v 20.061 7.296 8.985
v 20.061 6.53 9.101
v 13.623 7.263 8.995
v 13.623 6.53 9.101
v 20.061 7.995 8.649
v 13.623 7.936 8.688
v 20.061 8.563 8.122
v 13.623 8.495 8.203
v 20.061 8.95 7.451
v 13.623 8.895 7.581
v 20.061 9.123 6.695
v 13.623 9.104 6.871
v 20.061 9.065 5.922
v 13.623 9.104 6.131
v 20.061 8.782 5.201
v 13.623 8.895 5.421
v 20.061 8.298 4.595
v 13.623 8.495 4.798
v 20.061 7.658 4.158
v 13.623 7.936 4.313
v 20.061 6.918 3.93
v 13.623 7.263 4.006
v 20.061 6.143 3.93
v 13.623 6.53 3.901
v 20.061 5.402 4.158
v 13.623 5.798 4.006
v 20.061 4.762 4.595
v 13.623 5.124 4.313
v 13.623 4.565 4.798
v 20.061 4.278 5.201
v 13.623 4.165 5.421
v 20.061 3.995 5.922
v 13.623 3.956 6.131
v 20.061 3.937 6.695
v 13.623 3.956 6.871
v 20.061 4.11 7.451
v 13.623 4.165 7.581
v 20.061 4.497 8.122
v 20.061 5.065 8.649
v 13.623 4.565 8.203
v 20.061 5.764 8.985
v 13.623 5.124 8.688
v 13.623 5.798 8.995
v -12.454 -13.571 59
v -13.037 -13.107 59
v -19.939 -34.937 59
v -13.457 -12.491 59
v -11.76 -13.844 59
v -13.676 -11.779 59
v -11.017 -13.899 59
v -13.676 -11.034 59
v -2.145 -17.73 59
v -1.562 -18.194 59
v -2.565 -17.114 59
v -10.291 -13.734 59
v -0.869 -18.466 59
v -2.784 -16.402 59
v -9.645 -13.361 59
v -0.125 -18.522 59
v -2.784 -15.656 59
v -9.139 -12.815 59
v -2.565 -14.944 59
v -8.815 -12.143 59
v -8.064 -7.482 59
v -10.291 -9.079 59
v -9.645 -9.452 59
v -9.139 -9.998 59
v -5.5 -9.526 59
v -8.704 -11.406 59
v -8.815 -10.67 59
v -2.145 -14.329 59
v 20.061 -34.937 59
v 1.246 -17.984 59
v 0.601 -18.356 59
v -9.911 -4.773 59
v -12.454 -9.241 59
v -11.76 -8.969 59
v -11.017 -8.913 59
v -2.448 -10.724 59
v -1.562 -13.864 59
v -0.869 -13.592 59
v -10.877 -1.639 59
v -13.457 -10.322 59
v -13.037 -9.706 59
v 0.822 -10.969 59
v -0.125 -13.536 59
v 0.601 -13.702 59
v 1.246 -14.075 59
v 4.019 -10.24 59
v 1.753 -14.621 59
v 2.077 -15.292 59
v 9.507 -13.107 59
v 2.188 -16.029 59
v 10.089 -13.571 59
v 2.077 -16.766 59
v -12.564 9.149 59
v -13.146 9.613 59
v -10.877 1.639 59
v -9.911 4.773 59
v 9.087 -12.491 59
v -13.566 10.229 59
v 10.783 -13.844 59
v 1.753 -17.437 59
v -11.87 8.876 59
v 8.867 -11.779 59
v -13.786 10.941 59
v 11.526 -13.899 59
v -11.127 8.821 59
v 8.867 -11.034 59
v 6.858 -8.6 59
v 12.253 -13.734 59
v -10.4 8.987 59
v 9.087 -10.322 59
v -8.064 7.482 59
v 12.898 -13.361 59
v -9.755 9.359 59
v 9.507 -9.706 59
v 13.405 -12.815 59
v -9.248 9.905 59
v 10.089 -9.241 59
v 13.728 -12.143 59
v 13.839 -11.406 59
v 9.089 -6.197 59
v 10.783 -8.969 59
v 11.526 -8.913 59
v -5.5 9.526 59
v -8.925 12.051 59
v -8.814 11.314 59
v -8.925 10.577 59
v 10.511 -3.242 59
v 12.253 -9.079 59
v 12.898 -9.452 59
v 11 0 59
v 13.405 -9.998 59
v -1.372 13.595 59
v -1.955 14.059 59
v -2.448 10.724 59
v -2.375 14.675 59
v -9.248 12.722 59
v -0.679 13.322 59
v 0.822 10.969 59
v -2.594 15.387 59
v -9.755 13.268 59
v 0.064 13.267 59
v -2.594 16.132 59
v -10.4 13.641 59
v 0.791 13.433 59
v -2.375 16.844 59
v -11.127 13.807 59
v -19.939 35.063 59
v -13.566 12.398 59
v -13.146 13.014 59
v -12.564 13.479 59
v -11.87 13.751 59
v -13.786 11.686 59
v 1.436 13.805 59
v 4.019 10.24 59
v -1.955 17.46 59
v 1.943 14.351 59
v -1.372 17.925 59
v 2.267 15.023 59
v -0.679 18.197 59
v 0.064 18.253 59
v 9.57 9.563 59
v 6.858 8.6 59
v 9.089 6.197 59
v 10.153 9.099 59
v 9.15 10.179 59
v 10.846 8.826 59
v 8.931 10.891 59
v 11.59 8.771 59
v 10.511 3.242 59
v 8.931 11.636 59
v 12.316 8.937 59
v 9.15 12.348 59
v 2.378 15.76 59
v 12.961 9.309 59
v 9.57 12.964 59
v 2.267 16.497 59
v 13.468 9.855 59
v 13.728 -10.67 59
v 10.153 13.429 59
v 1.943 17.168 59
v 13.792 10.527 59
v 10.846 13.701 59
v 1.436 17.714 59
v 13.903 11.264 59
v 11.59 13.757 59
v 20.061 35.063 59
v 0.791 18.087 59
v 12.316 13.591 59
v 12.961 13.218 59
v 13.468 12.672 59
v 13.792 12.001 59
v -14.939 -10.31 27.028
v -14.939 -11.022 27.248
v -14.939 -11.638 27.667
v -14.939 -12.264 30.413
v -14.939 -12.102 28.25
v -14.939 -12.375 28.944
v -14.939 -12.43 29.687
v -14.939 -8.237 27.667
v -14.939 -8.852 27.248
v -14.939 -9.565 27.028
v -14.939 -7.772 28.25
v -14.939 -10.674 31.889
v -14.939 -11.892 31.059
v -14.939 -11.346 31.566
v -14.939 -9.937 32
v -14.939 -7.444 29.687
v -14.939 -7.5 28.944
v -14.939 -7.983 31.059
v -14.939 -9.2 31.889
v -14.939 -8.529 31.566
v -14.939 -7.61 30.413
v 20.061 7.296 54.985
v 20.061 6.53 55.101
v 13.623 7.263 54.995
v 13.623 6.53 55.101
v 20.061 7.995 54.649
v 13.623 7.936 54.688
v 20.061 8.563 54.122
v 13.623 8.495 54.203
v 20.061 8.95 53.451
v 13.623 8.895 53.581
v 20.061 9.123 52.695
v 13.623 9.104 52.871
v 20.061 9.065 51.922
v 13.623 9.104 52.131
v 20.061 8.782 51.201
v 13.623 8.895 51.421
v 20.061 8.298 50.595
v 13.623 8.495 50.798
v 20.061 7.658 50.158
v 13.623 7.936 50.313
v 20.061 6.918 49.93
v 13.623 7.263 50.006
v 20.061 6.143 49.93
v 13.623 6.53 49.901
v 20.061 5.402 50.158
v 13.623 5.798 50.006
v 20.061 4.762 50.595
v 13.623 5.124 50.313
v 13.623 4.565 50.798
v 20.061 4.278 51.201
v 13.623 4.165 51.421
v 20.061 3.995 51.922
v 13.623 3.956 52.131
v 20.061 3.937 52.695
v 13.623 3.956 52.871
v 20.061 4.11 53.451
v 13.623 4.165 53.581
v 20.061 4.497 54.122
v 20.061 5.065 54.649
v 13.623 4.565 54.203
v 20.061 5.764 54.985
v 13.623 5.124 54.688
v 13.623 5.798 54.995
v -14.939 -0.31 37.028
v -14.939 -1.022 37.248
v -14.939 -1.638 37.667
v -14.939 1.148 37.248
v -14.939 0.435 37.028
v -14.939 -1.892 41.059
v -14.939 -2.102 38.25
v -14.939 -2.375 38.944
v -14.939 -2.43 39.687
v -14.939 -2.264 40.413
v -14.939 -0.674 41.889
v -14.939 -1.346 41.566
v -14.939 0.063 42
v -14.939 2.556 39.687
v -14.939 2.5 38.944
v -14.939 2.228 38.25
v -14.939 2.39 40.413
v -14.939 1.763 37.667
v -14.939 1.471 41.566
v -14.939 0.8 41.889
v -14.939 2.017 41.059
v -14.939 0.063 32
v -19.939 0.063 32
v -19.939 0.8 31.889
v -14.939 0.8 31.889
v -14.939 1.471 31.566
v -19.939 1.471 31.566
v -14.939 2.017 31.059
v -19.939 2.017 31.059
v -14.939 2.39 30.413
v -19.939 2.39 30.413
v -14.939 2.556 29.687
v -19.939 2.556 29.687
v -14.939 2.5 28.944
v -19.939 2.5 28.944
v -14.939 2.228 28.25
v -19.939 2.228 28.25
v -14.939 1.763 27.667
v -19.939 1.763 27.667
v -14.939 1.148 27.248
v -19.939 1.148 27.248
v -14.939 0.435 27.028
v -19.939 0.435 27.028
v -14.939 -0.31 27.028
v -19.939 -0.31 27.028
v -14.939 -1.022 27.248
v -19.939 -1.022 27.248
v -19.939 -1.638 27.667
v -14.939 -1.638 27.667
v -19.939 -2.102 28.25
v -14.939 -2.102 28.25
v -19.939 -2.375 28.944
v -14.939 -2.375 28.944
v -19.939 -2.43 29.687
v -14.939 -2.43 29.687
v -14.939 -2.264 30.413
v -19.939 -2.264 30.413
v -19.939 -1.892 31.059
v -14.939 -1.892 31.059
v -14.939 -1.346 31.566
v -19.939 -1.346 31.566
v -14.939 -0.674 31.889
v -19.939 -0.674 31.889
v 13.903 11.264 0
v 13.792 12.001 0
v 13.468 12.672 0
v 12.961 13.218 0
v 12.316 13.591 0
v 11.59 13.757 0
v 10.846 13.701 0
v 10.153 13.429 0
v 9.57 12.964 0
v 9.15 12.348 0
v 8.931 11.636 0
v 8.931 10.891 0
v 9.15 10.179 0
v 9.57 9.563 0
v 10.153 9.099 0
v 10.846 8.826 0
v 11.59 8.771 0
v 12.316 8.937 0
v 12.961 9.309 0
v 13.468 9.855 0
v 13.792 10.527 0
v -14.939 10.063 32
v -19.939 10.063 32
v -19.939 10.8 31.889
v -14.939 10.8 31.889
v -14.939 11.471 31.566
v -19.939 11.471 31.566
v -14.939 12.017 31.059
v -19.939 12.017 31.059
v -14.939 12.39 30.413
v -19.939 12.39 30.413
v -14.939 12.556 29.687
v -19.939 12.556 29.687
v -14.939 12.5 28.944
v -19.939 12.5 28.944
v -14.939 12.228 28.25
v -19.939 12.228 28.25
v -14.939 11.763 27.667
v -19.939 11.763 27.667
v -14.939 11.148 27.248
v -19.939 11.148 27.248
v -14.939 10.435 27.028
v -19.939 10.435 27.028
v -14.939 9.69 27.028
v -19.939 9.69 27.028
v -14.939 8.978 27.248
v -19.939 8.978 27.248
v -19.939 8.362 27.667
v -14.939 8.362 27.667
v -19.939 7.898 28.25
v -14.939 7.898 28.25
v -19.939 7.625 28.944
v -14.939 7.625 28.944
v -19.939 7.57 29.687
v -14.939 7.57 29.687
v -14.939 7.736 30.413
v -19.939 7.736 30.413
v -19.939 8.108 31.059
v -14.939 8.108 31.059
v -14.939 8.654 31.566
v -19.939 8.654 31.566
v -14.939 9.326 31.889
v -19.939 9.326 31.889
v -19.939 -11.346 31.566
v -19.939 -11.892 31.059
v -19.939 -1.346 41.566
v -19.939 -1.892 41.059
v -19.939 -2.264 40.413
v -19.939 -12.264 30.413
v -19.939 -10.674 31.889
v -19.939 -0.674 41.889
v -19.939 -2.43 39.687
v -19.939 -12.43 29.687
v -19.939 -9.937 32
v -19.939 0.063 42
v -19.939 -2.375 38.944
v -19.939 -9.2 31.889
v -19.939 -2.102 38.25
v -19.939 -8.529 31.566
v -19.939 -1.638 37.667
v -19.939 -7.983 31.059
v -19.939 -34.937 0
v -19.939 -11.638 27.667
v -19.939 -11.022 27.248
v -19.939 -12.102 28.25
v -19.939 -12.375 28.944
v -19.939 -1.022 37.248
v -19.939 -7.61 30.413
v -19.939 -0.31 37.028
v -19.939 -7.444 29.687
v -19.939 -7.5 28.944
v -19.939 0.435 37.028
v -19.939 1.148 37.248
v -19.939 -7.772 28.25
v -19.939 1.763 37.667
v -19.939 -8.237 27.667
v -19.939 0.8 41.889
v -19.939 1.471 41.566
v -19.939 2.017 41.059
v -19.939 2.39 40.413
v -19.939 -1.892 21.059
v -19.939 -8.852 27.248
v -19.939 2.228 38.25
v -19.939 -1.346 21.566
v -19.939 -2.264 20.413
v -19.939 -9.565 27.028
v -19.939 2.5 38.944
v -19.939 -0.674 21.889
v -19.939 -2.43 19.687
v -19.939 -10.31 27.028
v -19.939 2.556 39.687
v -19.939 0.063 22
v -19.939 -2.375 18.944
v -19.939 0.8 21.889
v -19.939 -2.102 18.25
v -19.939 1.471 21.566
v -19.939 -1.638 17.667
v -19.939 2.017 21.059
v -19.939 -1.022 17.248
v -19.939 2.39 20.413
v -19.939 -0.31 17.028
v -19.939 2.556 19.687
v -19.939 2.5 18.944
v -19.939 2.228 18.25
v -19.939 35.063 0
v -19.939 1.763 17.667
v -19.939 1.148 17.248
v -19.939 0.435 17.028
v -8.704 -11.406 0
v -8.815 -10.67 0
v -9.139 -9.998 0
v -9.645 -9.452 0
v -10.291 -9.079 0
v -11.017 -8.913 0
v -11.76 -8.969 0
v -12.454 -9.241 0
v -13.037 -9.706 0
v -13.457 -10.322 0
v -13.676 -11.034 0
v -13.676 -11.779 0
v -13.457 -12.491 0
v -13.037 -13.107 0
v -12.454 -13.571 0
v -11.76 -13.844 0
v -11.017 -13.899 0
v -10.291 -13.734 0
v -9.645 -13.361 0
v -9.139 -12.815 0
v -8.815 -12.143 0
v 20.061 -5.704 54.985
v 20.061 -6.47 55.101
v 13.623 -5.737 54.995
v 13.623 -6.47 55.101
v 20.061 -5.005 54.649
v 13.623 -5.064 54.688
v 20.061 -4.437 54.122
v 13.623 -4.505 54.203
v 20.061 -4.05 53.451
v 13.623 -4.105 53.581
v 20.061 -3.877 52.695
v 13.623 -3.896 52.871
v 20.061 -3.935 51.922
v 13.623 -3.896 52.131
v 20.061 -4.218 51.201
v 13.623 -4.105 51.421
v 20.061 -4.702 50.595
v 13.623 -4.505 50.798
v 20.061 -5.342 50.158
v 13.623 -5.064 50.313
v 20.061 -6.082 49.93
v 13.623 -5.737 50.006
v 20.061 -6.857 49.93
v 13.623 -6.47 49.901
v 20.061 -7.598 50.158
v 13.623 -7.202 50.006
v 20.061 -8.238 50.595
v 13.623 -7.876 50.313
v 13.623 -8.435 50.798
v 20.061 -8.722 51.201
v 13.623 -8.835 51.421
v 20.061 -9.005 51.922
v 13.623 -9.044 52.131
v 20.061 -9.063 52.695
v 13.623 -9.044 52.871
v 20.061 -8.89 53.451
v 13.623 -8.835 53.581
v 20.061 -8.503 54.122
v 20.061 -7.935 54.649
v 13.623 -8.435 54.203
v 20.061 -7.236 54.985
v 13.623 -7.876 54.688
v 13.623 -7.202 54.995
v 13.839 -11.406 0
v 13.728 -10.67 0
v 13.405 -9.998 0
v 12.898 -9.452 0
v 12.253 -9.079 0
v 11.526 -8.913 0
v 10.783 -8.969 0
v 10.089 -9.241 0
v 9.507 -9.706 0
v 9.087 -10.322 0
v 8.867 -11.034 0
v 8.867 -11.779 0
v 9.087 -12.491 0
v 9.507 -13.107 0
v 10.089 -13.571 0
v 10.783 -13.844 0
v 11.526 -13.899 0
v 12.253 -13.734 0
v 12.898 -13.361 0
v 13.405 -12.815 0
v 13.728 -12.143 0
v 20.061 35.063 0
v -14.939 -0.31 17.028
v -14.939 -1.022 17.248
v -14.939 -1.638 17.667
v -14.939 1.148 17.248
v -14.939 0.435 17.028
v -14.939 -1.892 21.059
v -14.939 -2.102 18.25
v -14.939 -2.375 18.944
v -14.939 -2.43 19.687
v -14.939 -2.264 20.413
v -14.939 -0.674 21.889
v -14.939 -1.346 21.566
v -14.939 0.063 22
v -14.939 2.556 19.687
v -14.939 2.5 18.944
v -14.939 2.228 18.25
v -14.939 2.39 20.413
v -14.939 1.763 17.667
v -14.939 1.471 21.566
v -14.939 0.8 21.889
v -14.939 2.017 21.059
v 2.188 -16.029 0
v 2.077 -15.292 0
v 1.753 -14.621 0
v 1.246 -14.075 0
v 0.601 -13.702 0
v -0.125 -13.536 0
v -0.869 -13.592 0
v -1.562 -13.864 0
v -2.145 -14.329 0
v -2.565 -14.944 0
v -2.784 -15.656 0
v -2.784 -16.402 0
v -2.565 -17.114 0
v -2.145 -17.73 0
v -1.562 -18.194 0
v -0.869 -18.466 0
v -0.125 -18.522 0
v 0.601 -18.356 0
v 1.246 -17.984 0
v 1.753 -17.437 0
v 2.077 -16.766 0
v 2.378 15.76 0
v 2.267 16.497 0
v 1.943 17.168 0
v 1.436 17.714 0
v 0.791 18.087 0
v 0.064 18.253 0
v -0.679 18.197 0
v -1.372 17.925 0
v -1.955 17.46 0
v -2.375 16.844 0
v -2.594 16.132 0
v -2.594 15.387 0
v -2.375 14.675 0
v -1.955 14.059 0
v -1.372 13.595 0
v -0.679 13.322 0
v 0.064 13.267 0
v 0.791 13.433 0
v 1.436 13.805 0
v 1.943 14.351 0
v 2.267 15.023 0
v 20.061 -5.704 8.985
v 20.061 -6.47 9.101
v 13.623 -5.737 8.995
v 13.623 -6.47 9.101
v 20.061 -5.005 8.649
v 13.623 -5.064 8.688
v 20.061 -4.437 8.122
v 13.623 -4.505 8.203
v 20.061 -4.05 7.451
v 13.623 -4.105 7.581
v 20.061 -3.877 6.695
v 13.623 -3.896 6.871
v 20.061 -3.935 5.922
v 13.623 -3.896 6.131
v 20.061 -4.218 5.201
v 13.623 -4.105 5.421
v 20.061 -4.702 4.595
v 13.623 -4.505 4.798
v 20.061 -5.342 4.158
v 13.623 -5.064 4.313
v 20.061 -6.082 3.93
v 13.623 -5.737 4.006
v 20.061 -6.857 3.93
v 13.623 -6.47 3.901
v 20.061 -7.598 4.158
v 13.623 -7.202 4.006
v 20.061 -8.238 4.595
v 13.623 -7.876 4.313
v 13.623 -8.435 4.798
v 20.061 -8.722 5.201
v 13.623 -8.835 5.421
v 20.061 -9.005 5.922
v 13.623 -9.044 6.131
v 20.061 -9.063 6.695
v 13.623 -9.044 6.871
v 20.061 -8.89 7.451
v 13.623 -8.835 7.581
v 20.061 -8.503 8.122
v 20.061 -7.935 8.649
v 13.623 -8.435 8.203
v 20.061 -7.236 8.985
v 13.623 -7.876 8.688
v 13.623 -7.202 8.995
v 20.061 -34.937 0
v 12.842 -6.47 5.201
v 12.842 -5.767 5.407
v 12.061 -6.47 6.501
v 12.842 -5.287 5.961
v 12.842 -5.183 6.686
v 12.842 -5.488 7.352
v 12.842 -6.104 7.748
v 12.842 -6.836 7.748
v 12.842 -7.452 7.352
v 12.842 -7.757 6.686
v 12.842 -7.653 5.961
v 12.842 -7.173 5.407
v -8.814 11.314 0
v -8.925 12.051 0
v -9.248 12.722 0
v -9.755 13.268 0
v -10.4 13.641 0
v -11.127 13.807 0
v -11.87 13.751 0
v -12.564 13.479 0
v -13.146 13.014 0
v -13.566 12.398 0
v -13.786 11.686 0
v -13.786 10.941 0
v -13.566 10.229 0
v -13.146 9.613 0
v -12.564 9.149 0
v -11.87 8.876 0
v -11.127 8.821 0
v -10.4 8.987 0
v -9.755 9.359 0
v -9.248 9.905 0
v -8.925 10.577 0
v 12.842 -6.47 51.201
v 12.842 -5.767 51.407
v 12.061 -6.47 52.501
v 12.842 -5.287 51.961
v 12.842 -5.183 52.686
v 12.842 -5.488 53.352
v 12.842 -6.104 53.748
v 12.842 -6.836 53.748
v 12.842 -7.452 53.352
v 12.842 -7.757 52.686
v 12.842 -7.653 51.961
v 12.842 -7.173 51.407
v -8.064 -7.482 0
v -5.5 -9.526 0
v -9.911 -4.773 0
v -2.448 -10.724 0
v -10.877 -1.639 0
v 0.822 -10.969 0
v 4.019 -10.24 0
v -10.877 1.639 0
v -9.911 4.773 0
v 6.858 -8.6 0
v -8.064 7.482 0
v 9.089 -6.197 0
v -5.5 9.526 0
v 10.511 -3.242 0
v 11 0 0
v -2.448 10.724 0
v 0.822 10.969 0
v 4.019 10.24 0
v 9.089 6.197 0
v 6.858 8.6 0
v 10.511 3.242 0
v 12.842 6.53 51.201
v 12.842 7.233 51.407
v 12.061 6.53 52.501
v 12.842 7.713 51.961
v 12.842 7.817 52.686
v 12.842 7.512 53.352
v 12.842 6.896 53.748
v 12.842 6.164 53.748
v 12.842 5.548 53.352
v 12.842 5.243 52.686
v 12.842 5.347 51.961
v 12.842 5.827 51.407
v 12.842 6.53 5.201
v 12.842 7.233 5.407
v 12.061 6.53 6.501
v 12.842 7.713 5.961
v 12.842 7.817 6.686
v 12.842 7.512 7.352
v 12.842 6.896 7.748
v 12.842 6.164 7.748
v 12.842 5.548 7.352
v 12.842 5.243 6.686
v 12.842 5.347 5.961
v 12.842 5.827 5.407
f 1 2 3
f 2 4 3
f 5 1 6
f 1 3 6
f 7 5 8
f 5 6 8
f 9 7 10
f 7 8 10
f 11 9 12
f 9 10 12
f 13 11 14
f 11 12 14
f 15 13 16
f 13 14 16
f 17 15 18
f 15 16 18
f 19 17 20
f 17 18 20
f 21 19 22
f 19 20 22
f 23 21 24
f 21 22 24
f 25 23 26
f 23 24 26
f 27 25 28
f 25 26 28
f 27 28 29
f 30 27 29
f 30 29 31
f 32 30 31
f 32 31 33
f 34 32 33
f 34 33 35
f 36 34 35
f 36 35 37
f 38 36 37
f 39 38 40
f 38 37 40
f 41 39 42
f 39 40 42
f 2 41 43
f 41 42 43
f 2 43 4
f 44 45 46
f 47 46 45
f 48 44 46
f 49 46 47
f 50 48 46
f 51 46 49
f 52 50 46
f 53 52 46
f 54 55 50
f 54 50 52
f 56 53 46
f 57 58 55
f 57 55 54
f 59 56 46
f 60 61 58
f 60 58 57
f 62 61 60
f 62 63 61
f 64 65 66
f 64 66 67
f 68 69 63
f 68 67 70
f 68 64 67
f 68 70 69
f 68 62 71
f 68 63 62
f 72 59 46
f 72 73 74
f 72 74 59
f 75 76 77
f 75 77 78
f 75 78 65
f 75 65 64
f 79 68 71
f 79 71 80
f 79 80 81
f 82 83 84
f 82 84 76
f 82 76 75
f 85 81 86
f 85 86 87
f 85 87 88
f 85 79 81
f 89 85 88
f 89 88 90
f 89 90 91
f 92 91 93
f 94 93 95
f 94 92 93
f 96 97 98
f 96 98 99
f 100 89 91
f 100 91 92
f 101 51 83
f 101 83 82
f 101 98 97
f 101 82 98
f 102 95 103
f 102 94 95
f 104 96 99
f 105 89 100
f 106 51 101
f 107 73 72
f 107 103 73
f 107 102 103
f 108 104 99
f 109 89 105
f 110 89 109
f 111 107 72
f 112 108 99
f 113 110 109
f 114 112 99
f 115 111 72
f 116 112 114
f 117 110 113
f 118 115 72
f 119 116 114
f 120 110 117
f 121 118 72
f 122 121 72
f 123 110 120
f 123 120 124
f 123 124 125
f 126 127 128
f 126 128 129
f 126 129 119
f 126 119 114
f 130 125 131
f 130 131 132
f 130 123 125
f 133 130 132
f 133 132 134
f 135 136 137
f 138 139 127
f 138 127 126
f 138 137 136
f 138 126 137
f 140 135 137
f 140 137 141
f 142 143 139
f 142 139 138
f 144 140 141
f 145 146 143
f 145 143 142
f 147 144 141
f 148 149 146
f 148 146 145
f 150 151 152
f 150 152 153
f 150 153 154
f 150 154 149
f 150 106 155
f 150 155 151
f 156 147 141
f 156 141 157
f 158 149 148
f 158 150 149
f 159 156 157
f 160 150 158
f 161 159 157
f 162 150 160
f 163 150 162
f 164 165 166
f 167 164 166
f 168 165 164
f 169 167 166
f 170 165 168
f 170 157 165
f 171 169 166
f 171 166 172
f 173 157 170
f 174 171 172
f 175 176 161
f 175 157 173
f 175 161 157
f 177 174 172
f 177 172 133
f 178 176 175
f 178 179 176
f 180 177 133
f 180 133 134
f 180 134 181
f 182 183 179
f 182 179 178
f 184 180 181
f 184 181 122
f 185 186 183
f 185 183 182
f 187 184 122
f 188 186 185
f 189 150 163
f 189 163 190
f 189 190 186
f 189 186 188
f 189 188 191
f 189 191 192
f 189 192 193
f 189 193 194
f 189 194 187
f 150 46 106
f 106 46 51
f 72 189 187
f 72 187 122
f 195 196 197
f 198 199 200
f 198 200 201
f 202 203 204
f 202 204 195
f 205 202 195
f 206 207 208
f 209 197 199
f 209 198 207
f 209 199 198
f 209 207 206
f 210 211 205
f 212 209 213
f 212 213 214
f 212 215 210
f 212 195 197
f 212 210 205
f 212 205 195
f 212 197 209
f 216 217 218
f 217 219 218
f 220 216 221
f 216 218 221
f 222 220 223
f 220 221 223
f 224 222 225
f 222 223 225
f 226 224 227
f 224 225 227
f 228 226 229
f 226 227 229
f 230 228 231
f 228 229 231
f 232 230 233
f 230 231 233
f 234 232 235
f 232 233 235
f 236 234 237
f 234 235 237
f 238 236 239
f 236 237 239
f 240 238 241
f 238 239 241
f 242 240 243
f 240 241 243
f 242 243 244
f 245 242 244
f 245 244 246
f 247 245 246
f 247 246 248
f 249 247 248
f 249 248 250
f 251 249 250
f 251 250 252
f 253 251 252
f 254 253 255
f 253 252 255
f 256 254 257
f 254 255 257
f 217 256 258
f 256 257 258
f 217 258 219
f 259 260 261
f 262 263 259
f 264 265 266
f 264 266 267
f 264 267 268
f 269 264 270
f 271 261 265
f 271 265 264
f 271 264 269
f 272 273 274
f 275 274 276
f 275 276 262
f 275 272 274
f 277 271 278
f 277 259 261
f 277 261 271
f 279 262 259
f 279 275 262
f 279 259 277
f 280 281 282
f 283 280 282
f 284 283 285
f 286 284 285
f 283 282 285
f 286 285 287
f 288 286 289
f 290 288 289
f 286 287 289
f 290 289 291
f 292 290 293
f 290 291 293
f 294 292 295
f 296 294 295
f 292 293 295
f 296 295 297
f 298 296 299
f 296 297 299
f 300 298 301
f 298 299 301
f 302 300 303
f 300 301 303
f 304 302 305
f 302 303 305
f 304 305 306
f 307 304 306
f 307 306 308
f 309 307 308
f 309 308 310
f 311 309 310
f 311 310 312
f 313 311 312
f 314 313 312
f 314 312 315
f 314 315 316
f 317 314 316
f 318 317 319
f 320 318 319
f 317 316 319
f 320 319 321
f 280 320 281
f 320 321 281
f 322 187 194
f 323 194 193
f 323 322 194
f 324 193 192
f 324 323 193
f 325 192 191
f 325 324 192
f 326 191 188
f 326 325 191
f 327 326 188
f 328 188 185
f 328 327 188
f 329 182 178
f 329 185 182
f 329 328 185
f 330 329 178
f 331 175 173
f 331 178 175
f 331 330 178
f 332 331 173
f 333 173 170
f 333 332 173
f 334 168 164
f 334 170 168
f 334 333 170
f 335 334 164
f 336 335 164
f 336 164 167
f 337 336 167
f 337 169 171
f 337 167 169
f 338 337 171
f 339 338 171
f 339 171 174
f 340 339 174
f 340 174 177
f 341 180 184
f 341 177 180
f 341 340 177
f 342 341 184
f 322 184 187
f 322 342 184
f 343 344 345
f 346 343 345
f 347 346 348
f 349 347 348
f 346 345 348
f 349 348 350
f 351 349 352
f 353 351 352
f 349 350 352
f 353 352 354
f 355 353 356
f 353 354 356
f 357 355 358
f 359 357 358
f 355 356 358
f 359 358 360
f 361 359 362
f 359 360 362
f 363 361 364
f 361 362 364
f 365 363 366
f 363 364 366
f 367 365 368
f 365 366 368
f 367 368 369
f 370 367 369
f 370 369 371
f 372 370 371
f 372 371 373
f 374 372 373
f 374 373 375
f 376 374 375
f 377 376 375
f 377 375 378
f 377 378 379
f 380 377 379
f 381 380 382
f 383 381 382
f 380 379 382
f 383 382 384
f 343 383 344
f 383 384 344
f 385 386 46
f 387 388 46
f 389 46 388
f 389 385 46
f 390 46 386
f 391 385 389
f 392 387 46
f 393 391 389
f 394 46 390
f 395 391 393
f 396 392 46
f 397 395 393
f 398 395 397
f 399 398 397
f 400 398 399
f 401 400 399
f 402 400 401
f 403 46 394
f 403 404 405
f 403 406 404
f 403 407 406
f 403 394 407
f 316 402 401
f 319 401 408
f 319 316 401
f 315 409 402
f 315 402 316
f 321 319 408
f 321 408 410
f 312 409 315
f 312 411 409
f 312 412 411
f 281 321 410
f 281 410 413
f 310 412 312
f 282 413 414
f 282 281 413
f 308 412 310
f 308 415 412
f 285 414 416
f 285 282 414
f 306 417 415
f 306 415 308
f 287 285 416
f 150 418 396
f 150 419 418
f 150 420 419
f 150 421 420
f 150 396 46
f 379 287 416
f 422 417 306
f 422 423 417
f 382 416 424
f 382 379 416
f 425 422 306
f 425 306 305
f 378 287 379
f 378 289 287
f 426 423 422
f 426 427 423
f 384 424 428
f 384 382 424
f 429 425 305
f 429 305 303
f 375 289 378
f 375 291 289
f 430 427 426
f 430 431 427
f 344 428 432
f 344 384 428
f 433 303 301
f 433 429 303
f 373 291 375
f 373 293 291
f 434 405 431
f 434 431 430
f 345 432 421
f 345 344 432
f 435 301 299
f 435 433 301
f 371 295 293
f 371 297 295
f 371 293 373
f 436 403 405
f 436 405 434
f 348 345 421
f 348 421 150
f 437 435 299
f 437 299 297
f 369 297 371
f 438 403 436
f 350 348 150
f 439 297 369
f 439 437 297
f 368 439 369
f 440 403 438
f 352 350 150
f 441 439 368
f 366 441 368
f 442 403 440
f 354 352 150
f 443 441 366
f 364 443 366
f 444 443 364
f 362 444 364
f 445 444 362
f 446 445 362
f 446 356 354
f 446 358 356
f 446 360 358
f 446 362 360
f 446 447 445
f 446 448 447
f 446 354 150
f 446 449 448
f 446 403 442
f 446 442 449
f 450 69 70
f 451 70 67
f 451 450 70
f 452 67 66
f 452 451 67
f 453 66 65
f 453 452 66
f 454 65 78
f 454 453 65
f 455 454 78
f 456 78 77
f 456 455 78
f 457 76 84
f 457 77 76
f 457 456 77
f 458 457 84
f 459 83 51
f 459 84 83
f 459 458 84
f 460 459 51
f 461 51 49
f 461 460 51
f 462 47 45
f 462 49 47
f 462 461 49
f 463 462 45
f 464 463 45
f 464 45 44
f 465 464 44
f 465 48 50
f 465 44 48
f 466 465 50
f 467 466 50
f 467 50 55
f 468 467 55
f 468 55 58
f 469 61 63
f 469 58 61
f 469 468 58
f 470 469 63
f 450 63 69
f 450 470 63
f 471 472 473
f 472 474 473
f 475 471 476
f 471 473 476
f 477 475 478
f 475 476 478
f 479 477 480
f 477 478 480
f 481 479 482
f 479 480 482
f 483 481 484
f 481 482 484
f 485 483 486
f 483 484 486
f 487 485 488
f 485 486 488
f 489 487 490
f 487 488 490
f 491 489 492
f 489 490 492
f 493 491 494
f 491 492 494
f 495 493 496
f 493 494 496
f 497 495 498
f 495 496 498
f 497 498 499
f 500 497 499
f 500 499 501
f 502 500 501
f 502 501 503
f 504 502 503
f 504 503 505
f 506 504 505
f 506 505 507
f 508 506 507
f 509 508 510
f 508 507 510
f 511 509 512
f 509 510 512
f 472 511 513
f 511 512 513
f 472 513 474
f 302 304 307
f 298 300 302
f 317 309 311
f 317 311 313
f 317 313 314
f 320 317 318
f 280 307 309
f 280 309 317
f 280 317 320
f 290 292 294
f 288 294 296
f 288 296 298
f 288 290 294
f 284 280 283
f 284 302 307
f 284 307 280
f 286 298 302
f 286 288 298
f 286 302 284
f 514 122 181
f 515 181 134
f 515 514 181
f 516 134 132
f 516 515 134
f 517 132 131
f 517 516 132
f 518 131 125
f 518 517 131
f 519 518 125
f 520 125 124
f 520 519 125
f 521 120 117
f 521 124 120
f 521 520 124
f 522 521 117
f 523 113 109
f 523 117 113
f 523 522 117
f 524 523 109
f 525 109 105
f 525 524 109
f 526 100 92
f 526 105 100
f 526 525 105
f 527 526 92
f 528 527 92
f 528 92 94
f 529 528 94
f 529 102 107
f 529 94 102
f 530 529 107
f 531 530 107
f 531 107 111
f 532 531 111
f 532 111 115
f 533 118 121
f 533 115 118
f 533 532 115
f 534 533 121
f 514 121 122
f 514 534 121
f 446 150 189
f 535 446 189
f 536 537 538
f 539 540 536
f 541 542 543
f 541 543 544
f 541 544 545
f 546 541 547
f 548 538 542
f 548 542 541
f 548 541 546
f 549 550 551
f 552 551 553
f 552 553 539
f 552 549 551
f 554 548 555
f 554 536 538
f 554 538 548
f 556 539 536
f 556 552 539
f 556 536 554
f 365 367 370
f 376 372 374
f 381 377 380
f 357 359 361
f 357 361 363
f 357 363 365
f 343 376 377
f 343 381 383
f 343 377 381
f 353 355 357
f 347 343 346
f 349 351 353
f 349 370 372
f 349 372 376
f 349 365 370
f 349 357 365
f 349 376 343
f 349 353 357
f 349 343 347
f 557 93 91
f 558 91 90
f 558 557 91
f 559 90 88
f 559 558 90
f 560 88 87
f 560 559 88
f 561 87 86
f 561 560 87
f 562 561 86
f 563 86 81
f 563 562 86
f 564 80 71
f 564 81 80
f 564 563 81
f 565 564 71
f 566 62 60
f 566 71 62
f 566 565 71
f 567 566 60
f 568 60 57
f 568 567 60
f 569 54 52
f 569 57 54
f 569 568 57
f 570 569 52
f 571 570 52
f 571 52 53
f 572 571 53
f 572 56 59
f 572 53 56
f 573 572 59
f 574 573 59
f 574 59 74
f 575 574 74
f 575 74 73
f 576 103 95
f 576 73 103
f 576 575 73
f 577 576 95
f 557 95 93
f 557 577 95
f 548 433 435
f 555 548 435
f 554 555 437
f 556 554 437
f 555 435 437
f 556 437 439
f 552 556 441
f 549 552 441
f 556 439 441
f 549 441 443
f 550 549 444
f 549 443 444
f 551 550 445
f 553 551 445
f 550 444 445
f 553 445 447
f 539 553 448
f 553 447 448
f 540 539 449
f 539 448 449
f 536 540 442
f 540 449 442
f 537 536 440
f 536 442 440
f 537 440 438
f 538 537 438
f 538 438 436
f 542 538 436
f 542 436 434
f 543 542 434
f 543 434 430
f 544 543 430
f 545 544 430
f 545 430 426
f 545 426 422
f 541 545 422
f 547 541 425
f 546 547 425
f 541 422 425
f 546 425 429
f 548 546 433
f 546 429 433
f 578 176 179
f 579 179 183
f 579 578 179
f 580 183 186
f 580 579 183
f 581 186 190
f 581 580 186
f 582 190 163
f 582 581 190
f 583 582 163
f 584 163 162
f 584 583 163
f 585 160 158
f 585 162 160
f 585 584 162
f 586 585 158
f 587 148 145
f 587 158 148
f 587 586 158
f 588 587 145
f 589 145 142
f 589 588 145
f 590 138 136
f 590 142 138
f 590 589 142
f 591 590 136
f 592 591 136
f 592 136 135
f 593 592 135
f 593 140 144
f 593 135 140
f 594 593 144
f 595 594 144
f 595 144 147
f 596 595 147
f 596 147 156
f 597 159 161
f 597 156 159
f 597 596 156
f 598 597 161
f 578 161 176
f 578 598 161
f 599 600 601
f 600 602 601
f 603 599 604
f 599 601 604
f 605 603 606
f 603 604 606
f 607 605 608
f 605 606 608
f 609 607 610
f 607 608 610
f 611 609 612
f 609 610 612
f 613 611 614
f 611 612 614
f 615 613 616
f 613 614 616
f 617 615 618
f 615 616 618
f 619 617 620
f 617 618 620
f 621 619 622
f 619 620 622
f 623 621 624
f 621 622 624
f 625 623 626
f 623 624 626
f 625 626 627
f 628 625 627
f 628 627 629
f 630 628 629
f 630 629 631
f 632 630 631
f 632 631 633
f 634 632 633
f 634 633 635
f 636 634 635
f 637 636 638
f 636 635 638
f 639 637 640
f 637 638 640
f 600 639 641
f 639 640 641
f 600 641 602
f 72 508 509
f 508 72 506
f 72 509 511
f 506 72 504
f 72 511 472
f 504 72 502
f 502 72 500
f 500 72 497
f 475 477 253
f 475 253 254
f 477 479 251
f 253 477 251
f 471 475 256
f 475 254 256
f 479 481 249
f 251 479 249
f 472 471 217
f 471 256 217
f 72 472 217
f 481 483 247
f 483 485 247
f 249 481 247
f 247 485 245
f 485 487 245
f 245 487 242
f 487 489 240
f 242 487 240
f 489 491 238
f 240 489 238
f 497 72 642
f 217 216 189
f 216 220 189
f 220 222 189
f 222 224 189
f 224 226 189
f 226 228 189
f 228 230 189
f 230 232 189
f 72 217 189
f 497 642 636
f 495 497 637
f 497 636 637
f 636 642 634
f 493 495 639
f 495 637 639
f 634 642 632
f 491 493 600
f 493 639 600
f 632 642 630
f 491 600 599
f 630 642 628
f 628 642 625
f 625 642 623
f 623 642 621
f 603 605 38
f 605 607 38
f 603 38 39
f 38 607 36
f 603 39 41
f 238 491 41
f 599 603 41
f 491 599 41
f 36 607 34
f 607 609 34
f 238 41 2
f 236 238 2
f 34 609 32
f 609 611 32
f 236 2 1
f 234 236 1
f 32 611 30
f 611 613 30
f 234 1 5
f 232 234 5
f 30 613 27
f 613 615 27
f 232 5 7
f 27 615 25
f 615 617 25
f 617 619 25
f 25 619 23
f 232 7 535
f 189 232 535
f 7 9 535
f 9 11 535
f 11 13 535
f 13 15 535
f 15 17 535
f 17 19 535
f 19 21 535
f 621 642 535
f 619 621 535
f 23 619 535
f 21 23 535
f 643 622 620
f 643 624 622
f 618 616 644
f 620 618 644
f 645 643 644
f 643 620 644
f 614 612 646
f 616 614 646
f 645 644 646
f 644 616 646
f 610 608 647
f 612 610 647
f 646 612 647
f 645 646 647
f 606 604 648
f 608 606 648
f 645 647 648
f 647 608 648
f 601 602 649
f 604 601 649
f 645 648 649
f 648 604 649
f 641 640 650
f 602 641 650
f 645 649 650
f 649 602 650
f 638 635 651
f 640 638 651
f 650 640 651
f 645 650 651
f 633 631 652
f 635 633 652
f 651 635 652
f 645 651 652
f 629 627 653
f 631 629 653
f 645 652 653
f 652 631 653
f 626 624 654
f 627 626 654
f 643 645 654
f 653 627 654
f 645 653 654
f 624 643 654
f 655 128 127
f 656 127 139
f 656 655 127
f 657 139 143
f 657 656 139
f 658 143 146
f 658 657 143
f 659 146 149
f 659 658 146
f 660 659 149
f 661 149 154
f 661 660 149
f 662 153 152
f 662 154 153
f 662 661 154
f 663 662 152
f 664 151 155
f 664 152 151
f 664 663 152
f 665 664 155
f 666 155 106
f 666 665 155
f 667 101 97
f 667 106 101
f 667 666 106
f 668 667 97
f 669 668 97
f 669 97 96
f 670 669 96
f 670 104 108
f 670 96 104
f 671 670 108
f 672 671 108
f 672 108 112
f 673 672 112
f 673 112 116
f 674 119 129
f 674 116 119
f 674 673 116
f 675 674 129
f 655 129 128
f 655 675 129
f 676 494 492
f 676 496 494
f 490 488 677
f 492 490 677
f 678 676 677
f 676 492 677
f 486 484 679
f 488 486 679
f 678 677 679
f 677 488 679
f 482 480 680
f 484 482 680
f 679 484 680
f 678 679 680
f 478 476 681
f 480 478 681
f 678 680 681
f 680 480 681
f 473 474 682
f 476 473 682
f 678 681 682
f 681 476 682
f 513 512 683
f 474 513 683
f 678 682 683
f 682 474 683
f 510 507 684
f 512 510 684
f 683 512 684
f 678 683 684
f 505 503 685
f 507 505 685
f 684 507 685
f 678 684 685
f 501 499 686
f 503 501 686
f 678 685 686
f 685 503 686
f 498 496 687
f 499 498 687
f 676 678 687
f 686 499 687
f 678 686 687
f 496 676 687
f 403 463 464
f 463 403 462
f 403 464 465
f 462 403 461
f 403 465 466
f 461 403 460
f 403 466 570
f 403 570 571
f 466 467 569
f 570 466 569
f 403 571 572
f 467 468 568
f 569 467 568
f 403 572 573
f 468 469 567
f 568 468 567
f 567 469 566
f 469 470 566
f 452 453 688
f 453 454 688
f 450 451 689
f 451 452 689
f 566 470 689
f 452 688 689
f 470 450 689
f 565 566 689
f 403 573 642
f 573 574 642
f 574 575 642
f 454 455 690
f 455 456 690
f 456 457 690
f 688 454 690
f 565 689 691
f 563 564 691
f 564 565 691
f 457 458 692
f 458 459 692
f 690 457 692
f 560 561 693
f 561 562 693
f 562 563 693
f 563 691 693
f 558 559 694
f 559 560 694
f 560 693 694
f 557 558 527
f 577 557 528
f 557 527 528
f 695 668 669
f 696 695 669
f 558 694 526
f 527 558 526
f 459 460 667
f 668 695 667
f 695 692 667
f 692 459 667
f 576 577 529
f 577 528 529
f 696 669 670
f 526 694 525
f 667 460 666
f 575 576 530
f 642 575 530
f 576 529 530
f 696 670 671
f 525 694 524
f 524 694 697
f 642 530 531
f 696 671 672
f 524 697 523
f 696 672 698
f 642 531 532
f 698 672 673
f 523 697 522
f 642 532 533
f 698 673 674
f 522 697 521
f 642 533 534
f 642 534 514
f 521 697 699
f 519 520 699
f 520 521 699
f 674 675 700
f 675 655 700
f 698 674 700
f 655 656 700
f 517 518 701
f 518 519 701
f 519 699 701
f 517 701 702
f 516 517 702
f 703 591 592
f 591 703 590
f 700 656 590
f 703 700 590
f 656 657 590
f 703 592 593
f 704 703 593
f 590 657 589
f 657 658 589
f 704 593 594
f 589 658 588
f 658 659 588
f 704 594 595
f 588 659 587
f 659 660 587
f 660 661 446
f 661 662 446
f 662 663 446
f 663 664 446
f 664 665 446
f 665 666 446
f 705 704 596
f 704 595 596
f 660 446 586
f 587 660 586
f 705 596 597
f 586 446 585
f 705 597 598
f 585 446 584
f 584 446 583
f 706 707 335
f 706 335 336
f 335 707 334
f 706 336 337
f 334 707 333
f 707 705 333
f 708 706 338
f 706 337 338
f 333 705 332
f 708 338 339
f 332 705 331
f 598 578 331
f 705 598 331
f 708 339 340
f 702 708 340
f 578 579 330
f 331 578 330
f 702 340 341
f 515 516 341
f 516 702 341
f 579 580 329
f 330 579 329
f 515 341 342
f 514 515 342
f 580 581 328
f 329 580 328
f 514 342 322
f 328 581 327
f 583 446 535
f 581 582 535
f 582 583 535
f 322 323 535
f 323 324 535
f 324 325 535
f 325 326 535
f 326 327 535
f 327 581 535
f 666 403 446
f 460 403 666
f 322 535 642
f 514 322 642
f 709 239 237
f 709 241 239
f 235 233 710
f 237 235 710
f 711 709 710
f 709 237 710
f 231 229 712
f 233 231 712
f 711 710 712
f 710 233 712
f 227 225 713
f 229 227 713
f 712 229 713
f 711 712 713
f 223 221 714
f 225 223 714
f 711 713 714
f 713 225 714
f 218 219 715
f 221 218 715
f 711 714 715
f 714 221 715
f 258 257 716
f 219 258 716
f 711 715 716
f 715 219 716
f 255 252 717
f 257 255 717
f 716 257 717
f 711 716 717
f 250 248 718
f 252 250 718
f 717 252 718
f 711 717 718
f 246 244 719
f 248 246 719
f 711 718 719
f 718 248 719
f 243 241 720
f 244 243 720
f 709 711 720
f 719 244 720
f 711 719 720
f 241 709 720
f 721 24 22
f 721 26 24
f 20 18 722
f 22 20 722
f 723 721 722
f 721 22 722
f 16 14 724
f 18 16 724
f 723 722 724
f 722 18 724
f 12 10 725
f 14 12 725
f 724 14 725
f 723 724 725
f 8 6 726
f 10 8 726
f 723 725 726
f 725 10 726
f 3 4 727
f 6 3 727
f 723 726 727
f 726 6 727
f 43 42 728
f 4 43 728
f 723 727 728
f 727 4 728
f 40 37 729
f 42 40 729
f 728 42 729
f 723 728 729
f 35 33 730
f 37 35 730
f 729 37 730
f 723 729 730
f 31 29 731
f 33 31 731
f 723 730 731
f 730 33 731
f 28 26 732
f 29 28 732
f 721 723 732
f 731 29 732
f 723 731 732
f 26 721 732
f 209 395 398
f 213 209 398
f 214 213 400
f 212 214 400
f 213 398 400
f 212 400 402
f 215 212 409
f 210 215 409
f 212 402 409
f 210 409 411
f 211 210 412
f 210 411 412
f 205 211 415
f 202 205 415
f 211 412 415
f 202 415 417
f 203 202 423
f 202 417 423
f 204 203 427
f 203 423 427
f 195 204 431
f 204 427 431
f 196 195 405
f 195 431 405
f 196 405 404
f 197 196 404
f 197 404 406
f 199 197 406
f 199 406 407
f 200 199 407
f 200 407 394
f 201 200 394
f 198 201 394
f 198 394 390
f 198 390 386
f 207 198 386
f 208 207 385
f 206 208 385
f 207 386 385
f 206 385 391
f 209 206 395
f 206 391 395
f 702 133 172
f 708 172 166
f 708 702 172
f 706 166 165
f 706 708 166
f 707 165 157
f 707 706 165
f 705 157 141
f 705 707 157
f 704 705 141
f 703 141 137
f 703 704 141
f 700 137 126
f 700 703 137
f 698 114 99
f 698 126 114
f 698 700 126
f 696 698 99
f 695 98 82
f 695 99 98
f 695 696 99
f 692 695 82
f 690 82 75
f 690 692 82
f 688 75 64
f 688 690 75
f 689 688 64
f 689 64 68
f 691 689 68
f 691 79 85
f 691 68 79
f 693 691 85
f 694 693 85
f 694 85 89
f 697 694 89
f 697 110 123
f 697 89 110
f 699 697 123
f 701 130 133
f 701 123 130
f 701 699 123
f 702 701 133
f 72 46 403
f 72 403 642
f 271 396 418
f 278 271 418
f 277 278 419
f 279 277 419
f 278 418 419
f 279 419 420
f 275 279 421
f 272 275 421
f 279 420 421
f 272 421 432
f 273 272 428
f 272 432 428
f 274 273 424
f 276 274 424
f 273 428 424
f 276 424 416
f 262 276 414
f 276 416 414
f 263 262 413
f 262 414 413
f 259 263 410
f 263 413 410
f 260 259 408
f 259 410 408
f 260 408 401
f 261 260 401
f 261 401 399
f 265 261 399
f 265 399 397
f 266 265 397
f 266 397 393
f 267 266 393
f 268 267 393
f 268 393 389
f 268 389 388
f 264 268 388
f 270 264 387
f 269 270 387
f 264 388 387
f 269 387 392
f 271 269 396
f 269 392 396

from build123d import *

# Parameters (mm, degrees)
SKETCH1_W                        = 40
SKETCH1_H                        = 70
BOSS_EXTRUDE1_DEPTH              = 59
SKETCH2_R                        = 11
SKETCH2_R_2                      = 2.5
CUT_EXTRUDE1_DEPTH               = 72.504101247
SKETCH5_R                        = 2.5
CUT_EXTRUDE3_DEPTH               = 5
TAP_DRILL_FOR_M5_HELICOIL1_D     = 5.2
TAP_DRILL_FOR_M5_HELICOIL1_DEPTH = 6.437762391
TAP_DRILL_FOR_M5_HELICOIL1_TIP   = 1.562237609


with BuildPart() as part:
    # Sketch1 → Boss-Extrude1 (new body)
    with BuildSketch(Plane.XY):
        with Locations((0.060830656, 0.062794648)):
            Rectangle(SKETCH1_W, SKETCH1_H)
    extrude(amount=BOSS_EXTRUDE1_DEPTH)

    # Sketch2 → Cut-Extrude1 (cut, through all)
    with BuildSketch(Plane.XY):
        Circle(SKETCH2_R)
        with Locations((-11.313708499, 11.313708499)):
            Circle(SKETCH2_R_2)
        with Locations((-0.122338904, 15.759725587)):
            Circle(SKETCH2_R_2)
        with Locations((11.402693442, 11.263696484)):
            Circle(SKETCH2_R_2)
        with Locations((11.339369089, -11.406422087)):
            Circle(SKETCH2_R_2)
        with Locations((-0.312311964, -16.029099896)):
            Circle(SKETCH2_R_2)
        with Locations((-11.204100775, -11.406422087)):
            Circle(SKETCH2_R_2)
    extrude(amount=CUT_EXTRUDE1_DEPTH, mode=Mode.SUBTRACT)

    # Sketch5 → Cut-Extrude3 (cut)
    with BuildSketch(Plane.ZY.offset(19.939169344)):
        with Locations((29.5, 0.062794648)):
            Circle(SKETCH5_R)
        with Locations((39.5, 0.062794648)):
            Circle(SKETCH5_R)
        with Locations((19.5, 0.062794648)):
            Circle(SKETCH5_R)
        with Locations((29.5, 10.062794648)):
            Circle(SKETCH5_R)
        with Locations((29.5, -9.937205352)):
            Circle(SKETCH5_R)
    extrude(amount=-CUT_EXTRUDE3_DEPTH, mode=Mode.SUBTRACT)

    # Tap Drill for M5 Helicoil1
    with Locations(Plane(origin=(20.060830656, 0, 0), x_dir=(0, 0, -1), z_dir=(1, 0, 0))):
        with Locations((-52.500633733, 6.530017119), (-52.500633733, -6.469982881), (-6.500633733, -6.469982881), (-6.500633733, 6.530017119)):
            Hole(TAP_DRILL_FOR_M5_HELICOIL1_D / 2, depth=TAP_DRILL_FOR_M5_HELICOIL1_DEPTH)
            with Locations((0, 0, -(TAP_DRILL_FOR_M5_HELICOIL1_DEPTH + TAP_DRILL_FOR_M5_HELICOIL1_TIP / 2))):  # 118° drill point
                Cone(0, TAP_DRILL_FOR_M5_HELICOIL1_D / 2, TAP_DRILL_FOR_M5_HELICOIL1_TIP, mode=Mode.SUBTRACT)


solid = part.part
